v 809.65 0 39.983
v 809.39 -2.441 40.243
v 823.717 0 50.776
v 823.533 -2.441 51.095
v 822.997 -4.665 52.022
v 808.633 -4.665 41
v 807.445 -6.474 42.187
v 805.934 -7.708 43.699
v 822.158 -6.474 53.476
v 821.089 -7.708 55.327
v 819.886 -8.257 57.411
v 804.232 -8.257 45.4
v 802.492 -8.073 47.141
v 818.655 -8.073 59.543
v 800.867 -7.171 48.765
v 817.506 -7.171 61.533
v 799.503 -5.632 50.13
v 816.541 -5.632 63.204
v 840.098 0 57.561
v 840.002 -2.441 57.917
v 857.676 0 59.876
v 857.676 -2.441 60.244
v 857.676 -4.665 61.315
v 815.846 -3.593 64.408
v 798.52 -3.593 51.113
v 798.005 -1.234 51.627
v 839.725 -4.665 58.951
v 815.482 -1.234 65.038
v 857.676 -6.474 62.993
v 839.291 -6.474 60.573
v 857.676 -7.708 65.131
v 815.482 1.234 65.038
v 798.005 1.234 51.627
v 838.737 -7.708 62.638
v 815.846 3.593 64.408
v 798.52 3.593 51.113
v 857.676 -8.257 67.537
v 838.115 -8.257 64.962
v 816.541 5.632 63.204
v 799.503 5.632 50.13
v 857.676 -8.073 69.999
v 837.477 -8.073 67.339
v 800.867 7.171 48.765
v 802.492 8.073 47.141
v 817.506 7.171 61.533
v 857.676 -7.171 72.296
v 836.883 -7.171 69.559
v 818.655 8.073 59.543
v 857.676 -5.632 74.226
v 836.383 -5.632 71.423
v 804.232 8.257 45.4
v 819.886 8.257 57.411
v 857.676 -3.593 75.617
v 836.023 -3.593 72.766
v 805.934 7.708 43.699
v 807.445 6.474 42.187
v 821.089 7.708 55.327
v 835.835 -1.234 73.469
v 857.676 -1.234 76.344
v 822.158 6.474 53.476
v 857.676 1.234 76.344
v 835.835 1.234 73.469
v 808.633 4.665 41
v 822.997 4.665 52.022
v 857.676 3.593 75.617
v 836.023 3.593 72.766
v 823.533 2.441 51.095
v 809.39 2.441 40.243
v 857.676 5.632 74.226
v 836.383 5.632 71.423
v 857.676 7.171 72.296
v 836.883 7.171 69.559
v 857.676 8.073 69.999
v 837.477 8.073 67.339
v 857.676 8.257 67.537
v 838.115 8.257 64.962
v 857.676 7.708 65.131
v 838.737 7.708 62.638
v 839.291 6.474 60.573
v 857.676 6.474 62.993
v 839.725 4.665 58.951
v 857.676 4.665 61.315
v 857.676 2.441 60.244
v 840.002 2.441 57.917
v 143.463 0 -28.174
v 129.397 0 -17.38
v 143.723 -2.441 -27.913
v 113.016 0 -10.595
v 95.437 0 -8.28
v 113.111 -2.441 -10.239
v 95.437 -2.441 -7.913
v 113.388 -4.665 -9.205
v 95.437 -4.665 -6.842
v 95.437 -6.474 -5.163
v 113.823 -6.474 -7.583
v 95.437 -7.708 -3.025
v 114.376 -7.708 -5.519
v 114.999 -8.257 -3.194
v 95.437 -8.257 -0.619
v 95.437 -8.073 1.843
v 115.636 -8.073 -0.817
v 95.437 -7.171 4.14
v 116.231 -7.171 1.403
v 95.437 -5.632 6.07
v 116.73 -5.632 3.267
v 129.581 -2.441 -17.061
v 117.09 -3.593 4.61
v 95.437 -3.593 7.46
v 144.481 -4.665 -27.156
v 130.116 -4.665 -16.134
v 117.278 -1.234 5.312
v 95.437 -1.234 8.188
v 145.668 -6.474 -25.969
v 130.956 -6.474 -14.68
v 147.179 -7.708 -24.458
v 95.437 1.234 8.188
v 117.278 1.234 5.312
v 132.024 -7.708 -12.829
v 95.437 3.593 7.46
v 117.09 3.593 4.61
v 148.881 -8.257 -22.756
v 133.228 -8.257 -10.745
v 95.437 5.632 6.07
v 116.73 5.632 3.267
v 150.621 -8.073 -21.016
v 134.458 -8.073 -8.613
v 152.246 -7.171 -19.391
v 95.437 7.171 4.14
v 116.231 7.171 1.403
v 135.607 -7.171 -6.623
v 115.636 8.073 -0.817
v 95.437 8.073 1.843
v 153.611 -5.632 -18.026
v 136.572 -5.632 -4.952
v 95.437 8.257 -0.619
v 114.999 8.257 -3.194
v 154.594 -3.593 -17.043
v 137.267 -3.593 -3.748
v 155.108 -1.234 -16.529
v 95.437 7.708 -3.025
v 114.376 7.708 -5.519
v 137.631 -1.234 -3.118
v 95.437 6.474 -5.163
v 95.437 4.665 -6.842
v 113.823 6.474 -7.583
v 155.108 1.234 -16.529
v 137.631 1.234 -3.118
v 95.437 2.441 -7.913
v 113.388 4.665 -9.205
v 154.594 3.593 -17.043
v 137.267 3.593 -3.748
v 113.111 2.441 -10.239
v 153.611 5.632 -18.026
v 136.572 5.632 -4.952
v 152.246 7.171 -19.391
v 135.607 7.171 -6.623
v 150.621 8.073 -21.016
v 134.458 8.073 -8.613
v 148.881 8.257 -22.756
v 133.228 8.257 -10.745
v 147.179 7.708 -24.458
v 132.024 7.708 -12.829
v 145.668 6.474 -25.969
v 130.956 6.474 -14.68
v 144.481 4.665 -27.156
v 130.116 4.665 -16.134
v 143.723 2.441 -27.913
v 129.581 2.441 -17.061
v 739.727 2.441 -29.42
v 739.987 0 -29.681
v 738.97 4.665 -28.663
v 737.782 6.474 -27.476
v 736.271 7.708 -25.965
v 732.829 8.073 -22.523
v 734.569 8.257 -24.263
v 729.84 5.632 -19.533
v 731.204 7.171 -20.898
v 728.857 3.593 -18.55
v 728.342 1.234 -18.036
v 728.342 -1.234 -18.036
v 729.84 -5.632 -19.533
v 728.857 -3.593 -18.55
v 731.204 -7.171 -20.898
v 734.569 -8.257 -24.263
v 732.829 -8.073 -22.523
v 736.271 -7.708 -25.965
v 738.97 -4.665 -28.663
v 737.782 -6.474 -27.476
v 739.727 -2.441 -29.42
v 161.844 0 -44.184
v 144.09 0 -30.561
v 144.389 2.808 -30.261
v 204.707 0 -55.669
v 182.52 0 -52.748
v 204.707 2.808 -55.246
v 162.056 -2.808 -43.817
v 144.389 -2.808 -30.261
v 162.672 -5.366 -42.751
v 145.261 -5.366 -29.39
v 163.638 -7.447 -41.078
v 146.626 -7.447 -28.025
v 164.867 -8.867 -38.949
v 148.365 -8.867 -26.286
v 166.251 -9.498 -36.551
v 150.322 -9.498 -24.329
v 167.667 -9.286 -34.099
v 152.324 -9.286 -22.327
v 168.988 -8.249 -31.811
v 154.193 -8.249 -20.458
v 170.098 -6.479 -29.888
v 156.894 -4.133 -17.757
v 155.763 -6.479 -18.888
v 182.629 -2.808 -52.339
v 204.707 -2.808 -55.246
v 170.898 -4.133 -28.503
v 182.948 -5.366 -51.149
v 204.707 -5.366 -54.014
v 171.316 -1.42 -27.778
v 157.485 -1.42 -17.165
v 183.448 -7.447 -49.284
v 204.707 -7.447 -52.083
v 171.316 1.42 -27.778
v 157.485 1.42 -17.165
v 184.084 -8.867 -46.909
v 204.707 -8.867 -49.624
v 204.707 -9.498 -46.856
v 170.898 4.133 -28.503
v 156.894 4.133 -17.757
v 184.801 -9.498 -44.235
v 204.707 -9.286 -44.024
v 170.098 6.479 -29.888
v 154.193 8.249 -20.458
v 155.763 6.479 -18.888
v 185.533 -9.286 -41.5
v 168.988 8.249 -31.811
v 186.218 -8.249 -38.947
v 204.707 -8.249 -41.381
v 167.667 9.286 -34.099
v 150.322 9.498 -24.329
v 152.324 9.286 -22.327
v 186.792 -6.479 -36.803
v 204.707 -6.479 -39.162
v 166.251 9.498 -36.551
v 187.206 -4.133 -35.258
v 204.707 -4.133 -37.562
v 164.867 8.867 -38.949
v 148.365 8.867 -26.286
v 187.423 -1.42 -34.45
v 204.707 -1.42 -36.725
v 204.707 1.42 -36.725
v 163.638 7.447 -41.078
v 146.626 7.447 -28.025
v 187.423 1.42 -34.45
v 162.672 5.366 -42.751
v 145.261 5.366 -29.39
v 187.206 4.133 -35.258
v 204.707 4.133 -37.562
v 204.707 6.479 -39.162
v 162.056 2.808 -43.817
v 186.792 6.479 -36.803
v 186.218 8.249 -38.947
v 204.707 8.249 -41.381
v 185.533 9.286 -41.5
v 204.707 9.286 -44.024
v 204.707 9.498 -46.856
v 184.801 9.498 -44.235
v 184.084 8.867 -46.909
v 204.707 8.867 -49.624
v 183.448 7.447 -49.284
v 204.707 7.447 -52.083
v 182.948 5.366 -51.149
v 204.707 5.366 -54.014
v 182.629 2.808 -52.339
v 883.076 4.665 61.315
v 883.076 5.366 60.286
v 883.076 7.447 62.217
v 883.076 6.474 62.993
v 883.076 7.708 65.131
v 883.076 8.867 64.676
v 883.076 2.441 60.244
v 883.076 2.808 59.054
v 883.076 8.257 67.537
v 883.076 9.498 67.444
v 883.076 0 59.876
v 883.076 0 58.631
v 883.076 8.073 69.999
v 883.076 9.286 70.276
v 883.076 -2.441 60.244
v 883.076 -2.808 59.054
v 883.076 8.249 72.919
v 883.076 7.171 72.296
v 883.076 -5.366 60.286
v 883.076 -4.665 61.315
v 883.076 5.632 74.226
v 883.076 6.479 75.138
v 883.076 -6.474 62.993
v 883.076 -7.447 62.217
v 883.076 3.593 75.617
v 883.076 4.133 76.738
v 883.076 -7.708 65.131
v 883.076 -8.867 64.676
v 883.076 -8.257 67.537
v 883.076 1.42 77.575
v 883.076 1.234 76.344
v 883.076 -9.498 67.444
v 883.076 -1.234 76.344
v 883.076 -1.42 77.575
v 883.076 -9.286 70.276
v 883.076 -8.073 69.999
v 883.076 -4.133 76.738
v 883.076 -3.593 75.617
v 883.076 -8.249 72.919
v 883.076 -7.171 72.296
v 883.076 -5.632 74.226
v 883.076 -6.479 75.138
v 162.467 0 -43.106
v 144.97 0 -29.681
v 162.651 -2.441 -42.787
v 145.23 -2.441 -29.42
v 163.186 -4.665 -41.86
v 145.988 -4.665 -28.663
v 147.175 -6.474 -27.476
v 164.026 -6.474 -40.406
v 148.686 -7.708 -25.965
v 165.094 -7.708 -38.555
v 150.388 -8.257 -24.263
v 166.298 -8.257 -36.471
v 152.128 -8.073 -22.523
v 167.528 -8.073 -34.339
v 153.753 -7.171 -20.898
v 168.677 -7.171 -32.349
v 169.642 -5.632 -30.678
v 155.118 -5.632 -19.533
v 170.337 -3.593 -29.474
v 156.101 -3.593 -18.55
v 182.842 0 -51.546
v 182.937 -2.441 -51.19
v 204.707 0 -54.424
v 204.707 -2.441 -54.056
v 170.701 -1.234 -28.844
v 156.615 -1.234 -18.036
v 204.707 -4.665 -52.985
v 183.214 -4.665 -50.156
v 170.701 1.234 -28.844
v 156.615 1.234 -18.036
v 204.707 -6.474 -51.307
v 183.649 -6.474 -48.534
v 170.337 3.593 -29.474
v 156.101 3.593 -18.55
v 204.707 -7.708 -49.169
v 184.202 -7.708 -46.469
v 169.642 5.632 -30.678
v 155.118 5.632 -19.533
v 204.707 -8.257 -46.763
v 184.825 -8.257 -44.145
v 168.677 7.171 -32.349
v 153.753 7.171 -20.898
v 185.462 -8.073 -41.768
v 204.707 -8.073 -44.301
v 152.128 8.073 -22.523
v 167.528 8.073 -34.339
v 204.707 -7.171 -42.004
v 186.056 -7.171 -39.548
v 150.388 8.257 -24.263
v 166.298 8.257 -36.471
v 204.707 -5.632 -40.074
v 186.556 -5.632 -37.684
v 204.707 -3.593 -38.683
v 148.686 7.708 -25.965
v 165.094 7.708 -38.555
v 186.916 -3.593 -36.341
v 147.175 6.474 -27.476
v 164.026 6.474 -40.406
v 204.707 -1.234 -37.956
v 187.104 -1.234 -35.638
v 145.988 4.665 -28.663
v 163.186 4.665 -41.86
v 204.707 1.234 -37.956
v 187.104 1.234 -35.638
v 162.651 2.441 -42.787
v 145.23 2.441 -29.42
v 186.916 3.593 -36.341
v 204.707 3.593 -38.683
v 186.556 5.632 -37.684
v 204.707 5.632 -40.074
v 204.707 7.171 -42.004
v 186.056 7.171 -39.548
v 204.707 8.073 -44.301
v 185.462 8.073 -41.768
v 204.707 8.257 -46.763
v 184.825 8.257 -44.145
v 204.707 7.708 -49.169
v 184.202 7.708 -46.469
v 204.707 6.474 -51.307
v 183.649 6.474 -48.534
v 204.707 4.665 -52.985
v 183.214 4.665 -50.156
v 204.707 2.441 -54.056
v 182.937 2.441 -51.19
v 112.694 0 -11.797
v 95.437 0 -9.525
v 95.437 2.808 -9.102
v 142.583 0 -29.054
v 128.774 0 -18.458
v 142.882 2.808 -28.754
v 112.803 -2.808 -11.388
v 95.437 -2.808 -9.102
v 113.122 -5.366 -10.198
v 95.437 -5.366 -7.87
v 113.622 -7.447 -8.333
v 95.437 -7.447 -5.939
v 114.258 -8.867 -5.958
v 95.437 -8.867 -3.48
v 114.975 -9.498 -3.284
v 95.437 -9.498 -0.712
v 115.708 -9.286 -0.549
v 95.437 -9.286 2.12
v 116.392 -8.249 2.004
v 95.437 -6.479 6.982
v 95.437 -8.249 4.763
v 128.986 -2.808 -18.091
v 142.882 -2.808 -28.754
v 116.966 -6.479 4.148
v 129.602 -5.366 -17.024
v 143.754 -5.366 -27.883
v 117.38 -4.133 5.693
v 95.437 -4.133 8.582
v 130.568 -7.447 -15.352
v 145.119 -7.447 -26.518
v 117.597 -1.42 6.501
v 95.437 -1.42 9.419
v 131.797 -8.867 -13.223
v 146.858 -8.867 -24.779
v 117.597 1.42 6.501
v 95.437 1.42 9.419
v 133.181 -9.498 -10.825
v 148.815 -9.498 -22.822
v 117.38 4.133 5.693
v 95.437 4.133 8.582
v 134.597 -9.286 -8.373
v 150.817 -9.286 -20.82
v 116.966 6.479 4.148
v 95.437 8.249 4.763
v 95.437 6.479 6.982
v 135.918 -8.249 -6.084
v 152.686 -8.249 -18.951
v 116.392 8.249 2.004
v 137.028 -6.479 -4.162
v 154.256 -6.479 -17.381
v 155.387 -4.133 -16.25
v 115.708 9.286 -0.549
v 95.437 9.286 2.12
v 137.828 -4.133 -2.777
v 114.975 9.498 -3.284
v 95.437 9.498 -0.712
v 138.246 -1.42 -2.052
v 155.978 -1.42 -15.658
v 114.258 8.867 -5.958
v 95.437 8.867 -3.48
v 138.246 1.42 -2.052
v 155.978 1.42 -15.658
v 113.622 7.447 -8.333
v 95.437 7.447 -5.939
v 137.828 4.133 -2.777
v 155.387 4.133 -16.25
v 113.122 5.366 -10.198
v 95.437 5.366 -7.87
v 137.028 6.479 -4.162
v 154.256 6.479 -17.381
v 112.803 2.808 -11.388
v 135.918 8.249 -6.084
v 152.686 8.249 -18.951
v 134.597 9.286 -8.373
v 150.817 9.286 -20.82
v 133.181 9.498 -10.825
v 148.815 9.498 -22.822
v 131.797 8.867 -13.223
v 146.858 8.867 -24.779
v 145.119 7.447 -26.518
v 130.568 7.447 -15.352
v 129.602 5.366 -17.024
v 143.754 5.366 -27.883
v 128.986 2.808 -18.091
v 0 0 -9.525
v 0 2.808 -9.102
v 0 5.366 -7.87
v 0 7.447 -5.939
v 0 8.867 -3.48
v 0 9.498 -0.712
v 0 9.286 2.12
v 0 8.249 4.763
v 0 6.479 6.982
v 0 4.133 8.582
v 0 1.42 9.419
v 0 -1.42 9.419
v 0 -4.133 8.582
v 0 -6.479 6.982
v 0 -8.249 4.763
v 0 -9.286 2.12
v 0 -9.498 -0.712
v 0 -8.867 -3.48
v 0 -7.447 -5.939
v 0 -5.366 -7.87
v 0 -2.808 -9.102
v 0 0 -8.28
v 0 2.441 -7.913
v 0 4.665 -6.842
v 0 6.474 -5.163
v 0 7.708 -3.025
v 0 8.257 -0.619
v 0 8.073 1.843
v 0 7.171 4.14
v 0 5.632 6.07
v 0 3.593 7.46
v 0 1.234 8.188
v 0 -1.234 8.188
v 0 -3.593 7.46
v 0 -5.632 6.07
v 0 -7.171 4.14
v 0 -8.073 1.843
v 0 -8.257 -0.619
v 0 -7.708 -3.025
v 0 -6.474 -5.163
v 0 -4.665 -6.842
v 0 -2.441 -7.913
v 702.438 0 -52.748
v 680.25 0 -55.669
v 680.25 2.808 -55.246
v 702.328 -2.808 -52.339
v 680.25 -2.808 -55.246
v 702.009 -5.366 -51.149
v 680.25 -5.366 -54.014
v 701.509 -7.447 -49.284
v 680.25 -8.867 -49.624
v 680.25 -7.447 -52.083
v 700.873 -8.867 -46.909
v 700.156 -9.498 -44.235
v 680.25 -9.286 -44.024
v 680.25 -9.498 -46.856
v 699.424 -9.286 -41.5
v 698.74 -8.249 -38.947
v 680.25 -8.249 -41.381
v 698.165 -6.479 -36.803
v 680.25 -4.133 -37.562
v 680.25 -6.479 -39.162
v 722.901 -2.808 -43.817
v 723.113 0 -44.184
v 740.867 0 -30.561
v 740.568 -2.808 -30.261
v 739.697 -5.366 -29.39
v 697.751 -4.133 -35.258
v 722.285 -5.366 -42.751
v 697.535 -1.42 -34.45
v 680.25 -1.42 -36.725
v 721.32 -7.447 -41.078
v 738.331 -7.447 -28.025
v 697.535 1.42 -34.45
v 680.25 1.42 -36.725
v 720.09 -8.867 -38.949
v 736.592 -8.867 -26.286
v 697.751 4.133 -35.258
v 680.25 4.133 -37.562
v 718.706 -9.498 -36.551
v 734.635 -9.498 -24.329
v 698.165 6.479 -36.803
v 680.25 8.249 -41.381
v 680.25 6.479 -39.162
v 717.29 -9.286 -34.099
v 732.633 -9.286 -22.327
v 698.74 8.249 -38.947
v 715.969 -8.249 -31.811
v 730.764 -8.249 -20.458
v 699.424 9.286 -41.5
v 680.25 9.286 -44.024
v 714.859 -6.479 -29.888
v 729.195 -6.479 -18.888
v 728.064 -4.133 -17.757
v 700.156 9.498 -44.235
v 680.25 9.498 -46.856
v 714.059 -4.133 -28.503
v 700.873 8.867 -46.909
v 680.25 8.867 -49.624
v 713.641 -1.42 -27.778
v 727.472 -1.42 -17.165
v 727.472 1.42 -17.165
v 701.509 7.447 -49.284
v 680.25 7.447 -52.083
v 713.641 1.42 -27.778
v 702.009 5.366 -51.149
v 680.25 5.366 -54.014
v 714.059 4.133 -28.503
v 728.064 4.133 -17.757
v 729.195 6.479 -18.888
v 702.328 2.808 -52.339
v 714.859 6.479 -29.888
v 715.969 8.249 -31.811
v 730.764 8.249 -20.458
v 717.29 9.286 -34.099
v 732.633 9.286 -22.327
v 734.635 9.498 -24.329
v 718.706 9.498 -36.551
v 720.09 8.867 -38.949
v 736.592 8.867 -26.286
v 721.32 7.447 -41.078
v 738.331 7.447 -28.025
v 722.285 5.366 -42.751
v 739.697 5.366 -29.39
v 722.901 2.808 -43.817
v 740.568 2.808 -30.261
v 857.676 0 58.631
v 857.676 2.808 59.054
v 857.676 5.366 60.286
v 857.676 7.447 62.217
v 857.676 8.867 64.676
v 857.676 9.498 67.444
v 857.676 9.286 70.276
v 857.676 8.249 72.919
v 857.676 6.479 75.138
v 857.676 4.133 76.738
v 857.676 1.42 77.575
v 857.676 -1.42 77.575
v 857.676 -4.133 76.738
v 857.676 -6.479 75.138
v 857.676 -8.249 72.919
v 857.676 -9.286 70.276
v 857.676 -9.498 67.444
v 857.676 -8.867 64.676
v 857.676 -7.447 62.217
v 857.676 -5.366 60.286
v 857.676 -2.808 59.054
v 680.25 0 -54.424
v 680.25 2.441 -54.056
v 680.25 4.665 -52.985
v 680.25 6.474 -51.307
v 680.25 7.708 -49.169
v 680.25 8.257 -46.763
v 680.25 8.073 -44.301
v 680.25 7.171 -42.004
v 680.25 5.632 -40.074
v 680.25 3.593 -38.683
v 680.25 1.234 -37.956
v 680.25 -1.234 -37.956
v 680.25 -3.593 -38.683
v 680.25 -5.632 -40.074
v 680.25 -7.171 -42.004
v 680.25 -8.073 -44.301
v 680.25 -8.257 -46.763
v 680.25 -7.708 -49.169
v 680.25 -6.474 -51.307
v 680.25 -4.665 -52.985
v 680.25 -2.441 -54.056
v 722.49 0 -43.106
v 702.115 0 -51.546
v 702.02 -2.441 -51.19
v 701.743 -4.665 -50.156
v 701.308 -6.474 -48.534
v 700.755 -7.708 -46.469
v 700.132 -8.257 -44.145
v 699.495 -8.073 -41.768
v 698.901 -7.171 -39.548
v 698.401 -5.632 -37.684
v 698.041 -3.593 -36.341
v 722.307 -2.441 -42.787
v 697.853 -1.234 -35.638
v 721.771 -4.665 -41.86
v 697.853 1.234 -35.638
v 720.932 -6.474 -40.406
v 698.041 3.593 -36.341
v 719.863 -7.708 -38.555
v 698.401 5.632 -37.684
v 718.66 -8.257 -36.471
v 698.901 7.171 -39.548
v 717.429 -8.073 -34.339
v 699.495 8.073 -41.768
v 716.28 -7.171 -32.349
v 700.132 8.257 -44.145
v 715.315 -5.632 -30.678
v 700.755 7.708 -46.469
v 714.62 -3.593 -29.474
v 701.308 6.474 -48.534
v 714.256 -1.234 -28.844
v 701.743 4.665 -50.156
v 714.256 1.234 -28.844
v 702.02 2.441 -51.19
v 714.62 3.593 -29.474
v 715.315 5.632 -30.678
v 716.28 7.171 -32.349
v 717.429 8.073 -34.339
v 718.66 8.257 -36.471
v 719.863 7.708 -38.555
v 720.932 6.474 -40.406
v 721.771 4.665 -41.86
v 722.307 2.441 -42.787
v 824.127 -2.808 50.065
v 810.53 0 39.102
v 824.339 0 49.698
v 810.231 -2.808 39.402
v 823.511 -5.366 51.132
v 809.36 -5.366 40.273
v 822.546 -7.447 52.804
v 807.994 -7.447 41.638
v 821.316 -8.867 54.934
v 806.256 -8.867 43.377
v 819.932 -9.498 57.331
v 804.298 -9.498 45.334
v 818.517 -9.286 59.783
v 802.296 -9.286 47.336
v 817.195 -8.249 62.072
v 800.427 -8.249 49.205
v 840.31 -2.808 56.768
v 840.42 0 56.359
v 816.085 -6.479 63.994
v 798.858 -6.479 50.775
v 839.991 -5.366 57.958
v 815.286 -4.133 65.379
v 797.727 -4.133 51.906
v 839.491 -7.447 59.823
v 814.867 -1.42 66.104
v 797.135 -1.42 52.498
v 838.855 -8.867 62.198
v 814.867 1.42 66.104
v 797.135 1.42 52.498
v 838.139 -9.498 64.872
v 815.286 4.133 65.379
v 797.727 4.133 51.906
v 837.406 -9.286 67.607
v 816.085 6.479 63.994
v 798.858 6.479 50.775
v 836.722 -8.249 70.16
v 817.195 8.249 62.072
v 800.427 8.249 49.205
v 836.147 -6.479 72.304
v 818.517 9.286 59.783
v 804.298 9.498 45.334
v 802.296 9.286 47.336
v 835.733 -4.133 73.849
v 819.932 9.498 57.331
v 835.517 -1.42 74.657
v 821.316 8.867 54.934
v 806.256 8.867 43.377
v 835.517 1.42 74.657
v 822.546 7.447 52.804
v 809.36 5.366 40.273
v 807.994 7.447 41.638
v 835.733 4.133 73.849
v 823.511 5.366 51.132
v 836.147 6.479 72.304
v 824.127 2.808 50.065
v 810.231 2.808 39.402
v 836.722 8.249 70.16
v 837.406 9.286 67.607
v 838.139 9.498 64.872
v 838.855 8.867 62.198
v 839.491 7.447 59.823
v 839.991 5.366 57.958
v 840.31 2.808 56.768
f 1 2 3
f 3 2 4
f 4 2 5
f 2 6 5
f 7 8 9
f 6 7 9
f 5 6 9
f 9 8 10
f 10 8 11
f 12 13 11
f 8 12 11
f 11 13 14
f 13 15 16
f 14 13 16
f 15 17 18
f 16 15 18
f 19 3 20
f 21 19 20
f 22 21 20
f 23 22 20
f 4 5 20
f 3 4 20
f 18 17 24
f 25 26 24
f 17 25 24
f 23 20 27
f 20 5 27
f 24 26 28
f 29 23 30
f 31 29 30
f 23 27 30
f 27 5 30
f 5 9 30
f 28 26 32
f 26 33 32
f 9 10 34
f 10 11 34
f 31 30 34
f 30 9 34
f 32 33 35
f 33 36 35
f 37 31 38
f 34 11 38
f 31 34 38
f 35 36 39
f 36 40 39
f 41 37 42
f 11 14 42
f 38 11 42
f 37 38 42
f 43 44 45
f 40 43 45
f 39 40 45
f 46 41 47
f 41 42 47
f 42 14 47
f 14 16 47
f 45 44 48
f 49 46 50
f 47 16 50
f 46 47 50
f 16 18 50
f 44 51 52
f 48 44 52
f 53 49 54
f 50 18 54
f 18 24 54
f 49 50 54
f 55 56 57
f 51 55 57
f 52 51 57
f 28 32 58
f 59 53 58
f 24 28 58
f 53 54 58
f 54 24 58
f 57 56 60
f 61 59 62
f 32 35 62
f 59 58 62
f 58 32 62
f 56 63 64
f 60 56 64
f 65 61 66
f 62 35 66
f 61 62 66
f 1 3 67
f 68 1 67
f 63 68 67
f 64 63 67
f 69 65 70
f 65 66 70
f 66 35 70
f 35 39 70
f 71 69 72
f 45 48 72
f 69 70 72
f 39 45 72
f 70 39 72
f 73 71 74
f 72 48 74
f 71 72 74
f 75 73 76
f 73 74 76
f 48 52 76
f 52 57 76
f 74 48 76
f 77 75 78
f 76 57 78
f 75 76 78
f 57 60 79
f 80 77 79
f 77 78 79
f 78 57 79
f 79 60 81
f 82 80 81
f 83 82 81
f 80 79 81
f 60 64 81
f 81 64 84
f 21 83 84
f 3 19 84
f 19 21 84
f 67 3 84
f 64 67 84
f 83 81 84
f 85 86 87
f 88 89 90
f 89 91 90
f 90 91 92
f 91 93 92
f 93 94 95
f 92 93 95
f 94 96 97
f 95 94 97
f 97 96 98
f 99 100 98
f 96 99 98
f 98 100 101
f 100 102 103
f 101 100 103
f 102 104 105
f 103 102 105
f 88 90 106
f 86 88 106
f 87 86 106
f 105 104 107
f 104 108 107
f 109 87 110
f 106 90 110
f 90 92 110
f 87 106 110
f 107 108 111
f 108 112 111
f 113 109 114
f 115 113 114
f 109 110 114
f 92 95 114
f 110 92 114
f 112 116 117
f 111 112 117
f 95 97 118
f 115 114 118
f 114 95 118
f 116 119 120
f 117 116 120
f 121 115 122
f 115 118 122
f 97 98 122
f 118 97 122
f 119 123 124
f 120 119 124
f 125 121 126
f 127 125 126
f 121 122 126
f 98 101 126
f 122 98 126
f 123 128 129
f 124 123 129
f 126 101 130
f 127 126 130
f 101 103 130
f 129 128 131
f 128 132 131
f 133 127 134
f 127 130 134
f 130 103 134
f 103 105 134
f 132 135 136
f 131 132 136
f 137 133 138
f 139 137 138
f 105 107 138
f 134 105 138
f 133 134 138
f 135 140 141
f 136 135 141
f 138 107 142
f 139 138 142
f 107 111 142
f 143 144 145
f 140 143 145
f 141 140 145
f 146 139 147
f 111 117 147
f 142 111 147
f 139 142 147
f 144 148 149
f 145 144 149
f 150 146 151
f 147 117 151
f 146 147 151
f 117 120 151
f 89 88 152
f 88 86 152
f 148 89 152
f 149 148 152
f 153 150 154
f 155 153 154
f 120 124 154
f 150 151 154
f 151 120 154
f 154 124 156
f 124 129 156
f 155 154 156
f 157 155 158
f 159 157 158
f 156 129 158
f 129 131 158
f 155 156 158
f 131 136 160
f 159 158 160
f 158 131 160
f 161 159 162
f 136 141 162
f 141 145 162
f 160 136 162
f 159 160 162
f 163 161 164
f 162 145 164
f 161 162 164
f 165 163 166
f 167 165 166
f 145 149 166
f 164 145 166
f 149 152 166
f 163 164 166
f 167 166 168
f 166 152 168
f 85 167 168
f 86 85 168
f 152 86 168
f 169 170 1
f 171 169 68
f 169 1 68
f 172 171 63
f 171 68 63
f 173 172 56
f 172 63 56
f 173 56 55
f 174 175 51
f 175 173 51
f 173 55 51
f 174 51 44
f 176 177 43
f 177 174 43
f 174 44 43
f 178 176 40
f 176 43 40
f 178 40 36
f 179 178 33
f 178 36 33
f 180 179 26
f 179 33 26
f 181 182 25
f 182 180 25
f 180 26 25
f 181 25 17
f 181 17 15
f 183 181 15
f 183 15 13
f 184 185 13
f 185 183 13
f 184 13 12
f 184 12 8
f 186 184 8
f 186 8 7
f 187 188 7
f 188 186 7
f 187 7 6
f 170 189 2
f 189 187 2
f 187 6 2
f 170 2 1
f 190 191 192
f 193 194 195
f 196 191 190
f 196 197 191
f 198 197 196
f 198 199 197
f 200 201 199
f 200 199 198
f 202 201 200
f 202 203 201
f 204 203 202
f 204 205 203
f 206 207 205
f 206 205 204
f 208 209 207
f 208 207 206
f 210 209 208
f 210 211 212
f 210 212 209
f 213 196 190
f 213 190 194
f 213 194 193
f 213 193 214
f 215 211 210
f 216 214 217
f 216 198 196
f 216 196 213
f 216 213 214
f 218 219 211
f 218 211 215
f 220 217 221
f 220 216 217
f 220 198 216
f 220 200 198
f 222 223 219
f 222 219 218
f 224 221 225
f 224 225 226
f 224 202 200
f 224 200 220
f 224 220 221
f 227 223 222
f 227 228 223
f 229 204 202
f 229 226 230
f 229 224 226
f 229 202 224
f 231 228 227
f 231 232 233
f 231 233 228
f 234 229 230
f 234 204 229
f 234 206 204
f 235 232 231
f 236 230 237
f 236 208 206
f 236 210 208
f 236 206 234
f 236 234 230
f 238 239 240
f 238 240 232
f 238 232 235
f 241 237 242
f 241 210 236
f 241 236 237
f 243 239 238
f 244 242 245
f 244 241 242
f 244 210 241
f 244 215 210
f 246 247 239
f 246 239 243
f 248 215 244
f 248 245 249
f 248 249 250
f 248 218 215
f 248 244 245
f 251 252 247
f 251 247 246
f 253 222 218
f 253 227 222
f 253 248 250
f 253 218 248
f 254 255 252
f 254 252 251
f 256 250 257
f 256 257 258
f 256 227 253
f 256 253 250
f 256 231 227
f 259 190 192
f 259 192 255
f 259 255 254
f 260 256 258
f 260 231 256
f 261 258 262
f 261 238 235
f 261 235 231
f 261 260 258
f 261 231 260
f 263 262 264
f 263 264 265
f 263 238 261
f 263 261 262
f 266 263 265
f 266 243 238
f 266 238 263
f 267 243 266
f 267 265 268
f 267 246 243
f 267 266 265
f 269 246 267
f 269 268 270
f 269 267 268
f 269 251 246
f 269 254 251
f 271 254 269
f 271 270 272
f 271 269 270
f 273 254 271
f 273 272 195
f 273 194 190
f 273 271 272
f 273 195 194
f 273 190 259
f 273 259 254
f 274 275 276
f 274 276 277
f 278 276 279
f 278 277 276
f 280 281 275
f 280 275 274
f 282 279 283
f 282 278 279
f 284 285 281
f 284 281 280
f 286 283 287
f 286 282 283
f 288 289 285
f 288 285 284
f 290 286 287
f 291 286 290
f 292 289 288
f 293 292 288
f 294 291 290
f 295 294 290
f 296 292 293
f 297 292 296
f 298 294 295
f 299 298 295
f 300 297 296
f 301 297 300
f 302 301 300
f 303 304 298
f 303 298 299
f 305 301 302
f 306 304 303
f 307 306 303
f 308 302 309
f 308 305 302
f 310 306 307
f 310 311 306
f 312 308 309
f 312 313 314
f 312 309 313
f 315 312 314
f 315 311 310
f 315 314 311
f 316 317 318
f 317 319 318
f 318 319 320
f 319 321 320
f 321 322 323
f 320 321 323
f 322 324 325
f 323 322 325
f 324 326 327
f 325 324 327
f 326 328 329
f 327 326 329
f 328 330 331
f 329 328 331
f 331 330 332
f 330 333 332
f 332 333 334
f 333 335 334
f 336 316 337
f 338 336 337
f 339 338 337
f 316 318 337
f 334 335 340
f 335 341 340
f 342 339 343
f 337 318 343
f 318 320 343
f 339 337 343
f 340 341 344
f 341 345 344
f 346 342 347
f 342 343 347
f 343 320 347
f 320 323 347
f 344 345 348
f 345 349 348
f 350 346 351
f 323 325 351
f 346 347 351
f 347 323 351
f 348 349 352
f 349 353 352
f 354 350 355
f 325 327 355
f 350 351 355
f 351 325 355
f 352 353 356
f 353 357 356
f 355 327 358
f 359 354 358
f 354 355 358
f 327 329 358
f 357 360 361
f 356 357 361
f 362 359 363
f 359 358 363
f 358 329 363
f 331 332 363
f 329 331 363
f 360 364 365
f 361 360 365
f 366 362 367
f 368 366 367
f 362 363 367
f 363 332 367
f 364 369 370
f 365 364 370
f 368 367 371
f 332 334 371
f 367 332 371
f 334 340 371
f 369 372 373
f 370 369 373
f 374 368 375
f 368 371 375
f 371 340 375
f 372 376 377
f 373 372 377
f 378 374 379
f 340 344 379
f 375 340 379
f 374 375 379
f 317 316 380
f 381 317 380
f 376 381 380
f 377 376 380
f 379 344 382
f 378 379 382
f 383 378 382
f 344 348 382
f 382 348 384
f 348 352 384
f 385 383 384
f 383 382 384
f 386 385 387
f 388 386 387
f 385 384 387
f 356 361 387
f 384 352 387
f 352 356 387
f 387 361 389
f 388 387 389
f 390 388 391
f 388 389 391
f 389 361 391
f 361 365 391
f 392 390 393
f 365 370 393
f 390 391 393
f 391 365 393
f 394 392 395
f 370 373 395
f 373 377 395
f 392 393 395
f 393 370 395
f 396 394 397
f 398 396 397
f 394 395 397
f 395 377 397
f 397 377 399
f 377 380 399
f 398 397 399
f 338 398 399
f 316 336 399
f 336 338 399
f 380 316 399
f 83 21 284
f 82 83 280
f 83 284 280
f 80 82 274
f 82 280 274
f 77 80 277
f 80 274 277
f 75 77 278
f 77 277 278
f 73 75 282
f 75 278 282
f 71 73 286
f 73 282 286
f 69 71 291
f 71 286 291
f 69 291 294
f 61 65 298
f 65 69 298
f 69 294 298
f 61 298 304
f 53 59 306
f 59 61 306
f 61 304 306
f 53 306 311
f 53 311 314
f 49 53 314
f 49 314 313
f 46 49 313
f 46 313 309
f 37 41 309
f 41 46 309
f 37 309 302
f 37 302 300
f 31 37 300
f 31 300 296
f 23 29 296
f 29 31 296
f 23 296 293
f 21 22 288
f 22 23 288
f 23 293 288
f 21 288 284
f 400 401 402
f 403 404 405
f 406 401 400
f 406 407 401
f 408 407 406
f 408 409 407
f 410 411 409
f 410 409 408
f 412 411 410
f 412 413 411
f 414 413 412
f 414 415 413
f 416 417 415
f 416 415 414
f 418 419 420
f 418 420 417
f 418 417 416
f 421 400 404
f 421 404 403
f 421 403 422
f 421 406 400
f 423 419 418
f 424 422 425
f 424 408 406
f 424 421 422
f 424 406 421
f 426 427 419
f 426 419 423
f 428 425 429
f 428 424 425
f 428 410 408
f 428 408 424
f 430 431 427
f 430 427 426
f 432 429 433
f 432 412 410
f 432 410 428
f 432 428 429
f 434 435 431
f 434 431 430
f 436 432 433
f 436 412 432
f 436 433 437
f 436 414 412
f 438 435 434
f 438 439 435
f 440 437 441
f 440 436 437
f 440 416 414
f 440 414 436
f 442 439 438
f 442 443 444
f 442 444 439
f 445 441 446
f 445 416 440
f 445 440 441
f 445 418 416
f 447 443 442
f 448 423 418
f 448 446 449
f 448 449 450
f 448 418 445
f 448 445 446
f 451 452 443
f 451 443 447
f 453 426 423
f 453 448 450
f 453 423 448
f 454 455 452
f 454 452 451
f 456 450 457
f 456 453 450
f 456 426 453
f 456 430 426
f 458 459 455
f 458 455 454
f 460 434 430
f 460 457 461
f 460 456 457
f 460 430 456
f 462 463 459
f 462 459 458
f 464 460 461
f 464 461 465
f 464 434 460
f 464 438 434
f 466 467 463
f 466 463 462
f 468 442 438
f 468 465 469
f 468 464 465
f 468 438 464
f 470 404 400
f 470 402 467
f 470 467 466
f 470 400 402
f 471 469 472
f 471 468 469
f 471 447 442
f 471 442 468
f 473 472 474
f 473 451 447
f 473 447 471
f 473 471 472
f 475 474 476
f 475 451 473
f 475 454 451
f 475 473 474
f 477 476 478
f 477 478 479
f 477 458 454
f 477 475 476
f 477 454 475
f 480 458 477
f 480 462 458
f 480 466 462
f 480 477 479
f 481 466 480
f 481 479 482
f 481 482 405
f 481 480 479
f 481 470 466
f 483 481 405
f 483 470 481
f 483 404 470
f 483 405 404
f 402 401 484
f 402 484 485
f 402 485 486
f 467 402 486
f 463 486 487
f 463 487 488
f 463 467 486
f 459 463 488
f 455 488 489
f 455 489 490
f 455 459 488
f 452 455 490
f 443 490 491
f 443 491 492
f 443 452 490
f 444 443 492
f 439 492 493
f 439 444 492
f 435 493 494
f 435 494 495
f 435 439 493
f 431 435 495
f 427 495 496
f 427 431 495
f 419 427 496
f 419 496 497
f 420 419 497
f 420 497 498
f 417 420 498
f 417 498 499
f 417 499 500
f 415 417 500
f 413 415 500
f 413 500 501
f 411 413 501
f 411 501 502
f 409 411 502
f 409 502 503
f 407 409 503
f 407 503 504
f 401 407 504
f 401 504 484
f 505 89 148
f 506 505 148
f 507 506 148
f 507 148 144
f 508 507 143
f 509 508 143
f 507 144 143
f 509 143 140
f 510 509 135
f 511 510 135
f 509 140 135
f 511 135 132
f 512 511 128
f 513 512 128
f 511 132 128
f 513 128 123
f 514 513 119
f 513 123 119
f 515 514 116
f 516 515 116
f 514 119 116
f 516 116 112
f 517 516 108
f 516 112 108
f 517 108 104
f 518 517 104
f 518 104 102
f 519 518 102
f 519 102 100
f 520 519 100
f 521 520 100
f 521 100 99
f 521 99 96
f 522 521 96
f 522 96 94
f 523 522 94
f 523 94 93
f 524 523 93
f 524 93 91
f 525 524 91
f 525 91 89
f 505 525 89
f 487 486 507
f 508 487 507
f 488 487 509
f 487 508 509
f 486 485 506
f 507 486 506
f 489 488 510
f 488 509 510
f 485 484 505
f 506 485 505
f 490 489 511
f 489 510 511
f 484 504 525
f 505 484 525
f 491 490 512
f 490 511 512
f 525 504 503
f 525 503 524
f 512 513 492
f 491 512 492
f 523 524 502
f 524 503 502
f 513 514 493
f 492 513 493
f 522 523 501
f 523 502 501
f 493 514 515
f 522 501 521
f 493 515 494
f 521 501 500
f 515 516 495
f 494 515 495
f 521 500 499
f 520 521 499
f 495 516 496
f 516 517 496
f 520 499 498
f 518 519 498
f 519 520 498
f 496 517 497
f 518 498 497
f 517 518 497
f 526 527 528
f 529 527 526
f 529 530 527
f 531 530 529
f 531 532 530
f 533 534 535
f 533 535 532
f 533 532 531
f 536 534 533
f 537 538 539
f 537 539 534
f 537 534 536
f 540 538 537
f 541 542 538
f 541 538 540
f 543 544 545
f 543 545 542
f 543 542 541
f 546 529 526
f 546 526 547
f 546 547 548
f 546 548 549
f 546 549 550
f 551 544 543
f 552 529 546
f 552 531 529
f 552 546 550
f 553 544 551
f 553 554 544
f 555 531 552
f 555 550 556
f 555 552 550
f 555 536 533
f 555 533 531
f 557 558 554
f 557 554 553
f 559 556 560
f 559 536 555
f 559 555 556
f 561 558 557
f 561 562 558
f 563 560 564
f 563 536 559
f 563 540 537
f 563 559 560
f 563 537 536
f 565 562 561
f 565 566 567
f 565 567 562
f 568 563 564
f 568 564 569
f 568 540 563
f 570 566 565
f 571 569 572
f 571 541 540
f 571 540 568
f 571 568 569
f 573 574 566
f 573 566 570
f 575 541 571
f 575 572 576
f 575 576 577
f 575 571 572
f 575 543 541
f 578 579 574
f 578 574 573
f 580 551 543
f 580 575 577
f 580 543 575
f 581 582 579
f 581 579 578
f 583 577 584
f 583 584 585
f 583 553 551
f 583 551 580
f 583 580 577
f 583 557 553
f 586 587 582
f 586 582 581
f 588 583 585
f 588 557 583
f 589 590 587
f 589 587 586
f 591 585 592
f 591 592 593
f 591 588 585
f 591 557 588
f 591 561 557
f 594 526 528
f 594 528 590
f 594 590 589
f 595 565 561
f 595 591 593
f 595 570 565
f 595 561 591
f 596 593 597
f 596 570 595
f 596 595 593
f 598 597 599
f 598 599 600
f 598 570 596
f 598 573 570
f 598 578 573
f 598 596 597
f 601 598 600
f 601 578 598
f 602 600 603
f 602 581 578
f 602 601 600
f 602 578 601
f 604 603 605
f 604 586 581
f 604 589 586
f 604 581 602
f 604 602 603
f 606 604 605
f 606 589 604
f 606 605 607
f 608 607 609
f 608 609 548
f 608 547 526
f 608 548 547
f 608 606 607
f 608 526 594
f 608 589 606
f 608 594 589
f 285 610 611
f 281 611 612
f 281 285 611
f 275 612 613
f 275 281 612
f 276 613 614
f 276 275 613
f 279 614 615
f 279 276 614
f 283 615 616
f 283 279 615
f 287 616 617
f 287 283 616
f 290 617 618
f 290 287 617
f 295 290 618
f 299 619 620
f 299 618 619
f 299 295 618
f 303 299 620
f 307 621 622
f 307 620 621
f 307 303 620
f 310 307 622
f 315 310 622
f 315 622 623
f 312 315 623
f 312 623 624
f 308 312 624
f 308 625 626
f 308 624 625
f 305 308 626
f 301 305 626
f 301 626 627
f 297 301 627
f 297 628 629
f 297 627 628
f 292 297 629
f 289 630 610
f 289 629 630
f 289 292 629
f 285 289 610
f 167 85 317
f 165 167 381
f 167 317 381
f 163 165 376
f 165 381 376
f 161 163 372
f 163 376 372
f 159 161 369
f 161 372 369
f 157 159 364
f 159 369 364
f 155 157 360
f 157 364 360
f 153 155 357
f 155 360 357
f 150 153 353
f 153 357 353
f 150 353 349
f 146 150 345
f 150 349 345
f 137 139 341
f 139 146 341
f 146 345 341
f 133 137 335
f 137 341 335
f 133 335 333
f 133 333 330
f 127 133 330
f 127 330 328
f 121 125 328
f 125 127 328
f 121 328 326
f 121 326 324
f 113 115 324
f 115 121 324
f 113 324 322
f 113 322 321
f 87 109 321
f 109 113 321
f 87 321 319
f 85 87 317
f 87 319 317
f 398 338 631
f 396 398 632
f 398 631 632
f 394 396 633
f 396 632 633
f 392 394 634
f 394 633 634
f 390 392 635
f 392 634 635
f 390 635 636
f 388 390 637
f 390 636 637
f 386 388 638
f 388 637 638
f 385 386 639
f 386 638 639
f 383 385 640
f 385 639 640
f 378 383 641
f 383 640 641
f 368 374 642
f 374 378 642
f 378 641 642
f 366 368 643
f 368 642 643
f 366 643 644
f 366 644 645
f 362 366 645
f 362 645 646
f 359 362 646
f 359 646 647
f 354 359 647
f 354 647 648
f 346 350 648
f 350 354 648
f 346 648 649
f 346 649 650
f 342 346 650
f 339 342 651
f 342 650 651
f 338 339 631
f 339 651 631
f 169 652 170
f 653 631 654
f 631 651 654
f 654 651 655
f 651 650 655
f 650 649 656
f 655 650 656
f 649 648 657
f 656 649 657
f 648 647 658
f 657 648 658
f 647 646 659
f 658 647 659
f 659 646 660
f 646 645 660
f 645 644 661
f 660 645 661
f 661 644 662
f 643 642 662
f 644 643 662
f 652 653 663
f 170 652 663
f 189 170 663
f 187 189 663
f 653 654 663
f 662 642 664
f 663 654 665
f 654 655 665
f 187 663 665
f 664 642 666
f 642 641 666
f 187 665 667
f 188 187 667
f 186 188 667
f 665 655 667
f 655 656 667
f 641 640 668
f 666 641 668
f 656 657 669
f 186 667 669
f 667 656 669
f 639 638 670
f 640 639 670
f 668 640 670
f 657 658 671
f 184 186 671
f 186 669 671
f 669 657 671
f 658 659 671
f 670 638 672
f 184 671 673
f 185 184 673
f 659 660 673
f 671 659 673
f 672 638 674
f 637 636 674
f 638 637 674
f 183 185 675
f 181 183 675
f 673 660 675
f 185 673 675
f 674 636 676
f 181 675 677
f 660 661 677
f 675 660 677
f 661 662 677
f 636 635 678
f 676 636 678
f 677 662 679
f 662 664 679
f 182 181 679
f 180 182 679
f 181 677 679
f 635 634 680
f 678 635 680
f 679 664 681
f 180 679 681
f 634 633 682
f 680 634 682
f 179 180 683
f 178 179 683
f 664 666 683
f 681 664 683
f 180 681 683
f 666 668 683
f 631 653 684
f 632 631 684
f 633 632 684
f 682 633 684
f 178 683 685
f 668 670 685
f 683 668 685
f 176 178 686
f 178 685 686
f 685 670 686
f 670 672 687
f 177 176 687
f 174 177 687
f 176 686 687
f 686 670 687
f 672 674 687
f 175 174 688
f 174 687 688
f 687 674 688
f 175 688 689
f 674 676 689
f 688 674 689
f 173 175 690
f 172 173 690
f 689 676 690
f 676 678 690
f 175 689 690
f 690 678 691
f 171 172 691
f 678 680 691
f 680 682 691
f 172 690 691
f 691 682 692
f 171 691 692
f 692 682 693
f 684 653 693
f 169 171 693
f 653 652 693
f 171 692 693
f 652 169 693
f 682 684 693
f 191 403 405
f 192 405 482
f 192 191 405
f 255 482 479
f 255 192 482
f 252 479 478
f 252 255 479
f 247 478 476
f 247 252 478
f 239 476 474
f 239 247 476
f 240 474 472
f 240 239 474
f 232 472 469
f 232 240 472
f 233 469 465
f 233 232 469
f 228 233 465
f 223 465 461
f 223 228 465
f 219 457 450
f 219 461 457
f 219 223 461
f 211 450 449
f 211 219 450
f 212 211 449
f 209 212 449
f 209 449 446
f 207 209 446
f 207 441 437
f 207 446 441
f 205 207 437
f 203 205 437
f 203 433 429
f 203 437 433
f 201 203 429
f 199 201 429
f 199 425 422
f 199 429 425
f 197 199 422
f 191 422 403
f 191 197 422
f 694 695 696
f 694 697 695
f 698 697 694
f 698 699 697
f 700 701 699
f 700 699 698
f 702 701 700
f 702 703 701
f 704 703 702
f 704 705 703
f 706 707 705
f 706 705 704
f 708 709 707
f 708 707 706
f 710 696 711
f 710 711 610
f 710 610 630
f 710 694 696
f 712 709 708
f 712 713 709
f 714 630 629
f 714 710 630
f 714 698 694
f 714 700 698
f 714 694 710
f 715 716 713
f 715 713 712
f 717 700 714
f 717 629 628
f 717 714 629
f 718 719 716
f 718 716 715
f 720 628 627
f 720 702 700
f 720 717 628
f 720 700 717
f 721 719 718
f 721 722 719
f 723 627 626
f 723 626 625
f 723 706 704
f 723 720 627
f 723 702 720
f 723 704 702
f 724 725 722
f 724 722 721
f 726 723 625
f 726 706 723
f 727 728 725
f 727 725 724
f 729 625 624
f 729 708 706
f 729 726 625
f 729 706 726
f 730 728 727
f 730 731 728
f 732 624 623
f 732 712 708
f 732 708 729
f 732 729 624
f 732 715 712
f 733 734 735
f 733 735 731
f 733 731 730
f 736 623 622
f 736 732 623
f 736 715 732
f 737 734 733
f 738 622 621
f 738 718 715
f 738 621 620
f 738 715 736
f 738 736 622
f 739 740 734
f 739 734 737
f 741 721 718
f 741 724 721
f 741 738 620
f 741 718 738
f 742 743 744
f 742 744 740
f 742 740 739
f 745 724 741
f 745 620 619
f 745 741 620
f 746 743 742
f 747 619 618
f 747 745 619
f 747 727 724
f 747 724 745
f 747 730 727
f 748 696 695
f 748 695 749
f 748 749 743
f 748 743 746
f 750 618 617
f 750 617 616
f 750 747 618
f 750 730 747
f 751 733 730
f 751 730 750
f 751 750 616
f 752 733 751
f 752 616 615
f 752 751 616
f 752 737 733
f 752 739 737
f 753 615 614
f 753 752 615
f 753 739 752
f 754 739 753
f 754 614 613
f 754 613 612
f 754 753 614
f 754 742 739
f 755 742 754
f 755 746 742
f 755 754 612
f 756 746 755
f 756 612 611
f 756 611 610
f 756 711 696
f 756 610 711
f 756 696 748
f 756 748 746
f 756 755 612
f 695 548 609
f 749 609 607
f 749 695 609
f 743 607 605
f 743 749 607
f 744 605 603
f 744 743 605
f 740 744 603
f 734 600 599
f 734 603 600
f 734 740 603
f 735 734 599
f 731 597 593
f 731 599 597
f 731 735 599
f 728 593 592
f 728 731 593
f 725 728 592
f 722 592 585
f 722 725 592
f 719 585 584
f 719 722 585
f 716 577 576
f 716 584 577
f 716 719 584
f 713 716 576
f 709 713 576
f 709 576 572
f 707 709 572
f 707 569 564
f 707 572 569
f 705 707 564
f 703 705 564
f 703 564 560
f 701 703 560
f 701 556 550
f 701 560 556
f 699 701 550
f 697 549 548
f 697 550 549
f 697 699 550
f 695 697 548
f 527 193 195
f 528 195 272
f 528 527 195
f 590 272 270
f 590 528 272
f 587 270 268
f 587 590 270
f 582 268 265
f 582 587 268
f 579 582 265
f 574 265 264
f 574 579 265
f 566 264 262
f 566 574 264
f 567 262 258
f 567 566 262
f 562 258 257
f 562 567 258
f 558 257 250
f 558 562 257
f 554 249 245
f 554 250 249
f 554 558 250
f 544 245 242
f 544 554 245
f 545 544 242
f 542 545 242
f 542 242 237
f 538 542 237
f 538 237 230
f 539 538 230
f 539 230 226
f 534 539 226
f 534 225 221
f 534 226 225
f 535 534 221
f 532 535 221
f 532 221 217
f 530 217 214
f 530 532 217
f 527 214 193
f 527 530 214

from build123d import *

# Parameters (mm, degrees)
SKETCH2_R   = 9.525
SKETCH2_R_2 = 8.2804


with BuildPart() as part:
    # Sweep1: sweep along a path in Sketch1
    with BuildLine(Plane(origin=(0, 0, 0), x_dir=(1, 0, 0), z_dir=(0, 1, 0))) as sweep1_path:
        Line((0, 0), (95.436926547, 0))
        ThreePointArc((95.436926547, 0), (124.597404093, 5.800379623), (149.318463274, 22.318463274))
        Line((149.318463274, 22.318463274), (150.825395518, 23.825395518))
        ThreePointArc((150.825395518, 23.825395518), (175.546454698, 40.343479169), (204.706932244, 46.143858792))
        Line((204.706932244, 46.143858792), (680.250251886, 46.143858792))
        ThreePointArc((680.250251886, 46.143858792), (709.410729432, 40.343479169), (734.131788612, 23.825395518))
        Line((734.131788612, 23.825395518), (803.794862065, -45.837677935))
        ThreePointArc((803.794862065, -45.837677935), (828.515921245, -62.355761586), (857.676398792, -68.156141208))
        Line((857.676398792, -68.156141208), (883.076398792, -68.156141208))
    # Sketch2 → Sweep1 (sweep)
    with BuildSketch(Plane(origin=(0, 0, 0), x_dir=(0, 0, -1), z_dir=(1, 0, 0))):
        Circle(SKETCH2_R)
        Circle(SKETCH2_R_2, mode=Mode.SUBTRACT)
    sweep(path=sweep1_path.line)


solid = part.part
